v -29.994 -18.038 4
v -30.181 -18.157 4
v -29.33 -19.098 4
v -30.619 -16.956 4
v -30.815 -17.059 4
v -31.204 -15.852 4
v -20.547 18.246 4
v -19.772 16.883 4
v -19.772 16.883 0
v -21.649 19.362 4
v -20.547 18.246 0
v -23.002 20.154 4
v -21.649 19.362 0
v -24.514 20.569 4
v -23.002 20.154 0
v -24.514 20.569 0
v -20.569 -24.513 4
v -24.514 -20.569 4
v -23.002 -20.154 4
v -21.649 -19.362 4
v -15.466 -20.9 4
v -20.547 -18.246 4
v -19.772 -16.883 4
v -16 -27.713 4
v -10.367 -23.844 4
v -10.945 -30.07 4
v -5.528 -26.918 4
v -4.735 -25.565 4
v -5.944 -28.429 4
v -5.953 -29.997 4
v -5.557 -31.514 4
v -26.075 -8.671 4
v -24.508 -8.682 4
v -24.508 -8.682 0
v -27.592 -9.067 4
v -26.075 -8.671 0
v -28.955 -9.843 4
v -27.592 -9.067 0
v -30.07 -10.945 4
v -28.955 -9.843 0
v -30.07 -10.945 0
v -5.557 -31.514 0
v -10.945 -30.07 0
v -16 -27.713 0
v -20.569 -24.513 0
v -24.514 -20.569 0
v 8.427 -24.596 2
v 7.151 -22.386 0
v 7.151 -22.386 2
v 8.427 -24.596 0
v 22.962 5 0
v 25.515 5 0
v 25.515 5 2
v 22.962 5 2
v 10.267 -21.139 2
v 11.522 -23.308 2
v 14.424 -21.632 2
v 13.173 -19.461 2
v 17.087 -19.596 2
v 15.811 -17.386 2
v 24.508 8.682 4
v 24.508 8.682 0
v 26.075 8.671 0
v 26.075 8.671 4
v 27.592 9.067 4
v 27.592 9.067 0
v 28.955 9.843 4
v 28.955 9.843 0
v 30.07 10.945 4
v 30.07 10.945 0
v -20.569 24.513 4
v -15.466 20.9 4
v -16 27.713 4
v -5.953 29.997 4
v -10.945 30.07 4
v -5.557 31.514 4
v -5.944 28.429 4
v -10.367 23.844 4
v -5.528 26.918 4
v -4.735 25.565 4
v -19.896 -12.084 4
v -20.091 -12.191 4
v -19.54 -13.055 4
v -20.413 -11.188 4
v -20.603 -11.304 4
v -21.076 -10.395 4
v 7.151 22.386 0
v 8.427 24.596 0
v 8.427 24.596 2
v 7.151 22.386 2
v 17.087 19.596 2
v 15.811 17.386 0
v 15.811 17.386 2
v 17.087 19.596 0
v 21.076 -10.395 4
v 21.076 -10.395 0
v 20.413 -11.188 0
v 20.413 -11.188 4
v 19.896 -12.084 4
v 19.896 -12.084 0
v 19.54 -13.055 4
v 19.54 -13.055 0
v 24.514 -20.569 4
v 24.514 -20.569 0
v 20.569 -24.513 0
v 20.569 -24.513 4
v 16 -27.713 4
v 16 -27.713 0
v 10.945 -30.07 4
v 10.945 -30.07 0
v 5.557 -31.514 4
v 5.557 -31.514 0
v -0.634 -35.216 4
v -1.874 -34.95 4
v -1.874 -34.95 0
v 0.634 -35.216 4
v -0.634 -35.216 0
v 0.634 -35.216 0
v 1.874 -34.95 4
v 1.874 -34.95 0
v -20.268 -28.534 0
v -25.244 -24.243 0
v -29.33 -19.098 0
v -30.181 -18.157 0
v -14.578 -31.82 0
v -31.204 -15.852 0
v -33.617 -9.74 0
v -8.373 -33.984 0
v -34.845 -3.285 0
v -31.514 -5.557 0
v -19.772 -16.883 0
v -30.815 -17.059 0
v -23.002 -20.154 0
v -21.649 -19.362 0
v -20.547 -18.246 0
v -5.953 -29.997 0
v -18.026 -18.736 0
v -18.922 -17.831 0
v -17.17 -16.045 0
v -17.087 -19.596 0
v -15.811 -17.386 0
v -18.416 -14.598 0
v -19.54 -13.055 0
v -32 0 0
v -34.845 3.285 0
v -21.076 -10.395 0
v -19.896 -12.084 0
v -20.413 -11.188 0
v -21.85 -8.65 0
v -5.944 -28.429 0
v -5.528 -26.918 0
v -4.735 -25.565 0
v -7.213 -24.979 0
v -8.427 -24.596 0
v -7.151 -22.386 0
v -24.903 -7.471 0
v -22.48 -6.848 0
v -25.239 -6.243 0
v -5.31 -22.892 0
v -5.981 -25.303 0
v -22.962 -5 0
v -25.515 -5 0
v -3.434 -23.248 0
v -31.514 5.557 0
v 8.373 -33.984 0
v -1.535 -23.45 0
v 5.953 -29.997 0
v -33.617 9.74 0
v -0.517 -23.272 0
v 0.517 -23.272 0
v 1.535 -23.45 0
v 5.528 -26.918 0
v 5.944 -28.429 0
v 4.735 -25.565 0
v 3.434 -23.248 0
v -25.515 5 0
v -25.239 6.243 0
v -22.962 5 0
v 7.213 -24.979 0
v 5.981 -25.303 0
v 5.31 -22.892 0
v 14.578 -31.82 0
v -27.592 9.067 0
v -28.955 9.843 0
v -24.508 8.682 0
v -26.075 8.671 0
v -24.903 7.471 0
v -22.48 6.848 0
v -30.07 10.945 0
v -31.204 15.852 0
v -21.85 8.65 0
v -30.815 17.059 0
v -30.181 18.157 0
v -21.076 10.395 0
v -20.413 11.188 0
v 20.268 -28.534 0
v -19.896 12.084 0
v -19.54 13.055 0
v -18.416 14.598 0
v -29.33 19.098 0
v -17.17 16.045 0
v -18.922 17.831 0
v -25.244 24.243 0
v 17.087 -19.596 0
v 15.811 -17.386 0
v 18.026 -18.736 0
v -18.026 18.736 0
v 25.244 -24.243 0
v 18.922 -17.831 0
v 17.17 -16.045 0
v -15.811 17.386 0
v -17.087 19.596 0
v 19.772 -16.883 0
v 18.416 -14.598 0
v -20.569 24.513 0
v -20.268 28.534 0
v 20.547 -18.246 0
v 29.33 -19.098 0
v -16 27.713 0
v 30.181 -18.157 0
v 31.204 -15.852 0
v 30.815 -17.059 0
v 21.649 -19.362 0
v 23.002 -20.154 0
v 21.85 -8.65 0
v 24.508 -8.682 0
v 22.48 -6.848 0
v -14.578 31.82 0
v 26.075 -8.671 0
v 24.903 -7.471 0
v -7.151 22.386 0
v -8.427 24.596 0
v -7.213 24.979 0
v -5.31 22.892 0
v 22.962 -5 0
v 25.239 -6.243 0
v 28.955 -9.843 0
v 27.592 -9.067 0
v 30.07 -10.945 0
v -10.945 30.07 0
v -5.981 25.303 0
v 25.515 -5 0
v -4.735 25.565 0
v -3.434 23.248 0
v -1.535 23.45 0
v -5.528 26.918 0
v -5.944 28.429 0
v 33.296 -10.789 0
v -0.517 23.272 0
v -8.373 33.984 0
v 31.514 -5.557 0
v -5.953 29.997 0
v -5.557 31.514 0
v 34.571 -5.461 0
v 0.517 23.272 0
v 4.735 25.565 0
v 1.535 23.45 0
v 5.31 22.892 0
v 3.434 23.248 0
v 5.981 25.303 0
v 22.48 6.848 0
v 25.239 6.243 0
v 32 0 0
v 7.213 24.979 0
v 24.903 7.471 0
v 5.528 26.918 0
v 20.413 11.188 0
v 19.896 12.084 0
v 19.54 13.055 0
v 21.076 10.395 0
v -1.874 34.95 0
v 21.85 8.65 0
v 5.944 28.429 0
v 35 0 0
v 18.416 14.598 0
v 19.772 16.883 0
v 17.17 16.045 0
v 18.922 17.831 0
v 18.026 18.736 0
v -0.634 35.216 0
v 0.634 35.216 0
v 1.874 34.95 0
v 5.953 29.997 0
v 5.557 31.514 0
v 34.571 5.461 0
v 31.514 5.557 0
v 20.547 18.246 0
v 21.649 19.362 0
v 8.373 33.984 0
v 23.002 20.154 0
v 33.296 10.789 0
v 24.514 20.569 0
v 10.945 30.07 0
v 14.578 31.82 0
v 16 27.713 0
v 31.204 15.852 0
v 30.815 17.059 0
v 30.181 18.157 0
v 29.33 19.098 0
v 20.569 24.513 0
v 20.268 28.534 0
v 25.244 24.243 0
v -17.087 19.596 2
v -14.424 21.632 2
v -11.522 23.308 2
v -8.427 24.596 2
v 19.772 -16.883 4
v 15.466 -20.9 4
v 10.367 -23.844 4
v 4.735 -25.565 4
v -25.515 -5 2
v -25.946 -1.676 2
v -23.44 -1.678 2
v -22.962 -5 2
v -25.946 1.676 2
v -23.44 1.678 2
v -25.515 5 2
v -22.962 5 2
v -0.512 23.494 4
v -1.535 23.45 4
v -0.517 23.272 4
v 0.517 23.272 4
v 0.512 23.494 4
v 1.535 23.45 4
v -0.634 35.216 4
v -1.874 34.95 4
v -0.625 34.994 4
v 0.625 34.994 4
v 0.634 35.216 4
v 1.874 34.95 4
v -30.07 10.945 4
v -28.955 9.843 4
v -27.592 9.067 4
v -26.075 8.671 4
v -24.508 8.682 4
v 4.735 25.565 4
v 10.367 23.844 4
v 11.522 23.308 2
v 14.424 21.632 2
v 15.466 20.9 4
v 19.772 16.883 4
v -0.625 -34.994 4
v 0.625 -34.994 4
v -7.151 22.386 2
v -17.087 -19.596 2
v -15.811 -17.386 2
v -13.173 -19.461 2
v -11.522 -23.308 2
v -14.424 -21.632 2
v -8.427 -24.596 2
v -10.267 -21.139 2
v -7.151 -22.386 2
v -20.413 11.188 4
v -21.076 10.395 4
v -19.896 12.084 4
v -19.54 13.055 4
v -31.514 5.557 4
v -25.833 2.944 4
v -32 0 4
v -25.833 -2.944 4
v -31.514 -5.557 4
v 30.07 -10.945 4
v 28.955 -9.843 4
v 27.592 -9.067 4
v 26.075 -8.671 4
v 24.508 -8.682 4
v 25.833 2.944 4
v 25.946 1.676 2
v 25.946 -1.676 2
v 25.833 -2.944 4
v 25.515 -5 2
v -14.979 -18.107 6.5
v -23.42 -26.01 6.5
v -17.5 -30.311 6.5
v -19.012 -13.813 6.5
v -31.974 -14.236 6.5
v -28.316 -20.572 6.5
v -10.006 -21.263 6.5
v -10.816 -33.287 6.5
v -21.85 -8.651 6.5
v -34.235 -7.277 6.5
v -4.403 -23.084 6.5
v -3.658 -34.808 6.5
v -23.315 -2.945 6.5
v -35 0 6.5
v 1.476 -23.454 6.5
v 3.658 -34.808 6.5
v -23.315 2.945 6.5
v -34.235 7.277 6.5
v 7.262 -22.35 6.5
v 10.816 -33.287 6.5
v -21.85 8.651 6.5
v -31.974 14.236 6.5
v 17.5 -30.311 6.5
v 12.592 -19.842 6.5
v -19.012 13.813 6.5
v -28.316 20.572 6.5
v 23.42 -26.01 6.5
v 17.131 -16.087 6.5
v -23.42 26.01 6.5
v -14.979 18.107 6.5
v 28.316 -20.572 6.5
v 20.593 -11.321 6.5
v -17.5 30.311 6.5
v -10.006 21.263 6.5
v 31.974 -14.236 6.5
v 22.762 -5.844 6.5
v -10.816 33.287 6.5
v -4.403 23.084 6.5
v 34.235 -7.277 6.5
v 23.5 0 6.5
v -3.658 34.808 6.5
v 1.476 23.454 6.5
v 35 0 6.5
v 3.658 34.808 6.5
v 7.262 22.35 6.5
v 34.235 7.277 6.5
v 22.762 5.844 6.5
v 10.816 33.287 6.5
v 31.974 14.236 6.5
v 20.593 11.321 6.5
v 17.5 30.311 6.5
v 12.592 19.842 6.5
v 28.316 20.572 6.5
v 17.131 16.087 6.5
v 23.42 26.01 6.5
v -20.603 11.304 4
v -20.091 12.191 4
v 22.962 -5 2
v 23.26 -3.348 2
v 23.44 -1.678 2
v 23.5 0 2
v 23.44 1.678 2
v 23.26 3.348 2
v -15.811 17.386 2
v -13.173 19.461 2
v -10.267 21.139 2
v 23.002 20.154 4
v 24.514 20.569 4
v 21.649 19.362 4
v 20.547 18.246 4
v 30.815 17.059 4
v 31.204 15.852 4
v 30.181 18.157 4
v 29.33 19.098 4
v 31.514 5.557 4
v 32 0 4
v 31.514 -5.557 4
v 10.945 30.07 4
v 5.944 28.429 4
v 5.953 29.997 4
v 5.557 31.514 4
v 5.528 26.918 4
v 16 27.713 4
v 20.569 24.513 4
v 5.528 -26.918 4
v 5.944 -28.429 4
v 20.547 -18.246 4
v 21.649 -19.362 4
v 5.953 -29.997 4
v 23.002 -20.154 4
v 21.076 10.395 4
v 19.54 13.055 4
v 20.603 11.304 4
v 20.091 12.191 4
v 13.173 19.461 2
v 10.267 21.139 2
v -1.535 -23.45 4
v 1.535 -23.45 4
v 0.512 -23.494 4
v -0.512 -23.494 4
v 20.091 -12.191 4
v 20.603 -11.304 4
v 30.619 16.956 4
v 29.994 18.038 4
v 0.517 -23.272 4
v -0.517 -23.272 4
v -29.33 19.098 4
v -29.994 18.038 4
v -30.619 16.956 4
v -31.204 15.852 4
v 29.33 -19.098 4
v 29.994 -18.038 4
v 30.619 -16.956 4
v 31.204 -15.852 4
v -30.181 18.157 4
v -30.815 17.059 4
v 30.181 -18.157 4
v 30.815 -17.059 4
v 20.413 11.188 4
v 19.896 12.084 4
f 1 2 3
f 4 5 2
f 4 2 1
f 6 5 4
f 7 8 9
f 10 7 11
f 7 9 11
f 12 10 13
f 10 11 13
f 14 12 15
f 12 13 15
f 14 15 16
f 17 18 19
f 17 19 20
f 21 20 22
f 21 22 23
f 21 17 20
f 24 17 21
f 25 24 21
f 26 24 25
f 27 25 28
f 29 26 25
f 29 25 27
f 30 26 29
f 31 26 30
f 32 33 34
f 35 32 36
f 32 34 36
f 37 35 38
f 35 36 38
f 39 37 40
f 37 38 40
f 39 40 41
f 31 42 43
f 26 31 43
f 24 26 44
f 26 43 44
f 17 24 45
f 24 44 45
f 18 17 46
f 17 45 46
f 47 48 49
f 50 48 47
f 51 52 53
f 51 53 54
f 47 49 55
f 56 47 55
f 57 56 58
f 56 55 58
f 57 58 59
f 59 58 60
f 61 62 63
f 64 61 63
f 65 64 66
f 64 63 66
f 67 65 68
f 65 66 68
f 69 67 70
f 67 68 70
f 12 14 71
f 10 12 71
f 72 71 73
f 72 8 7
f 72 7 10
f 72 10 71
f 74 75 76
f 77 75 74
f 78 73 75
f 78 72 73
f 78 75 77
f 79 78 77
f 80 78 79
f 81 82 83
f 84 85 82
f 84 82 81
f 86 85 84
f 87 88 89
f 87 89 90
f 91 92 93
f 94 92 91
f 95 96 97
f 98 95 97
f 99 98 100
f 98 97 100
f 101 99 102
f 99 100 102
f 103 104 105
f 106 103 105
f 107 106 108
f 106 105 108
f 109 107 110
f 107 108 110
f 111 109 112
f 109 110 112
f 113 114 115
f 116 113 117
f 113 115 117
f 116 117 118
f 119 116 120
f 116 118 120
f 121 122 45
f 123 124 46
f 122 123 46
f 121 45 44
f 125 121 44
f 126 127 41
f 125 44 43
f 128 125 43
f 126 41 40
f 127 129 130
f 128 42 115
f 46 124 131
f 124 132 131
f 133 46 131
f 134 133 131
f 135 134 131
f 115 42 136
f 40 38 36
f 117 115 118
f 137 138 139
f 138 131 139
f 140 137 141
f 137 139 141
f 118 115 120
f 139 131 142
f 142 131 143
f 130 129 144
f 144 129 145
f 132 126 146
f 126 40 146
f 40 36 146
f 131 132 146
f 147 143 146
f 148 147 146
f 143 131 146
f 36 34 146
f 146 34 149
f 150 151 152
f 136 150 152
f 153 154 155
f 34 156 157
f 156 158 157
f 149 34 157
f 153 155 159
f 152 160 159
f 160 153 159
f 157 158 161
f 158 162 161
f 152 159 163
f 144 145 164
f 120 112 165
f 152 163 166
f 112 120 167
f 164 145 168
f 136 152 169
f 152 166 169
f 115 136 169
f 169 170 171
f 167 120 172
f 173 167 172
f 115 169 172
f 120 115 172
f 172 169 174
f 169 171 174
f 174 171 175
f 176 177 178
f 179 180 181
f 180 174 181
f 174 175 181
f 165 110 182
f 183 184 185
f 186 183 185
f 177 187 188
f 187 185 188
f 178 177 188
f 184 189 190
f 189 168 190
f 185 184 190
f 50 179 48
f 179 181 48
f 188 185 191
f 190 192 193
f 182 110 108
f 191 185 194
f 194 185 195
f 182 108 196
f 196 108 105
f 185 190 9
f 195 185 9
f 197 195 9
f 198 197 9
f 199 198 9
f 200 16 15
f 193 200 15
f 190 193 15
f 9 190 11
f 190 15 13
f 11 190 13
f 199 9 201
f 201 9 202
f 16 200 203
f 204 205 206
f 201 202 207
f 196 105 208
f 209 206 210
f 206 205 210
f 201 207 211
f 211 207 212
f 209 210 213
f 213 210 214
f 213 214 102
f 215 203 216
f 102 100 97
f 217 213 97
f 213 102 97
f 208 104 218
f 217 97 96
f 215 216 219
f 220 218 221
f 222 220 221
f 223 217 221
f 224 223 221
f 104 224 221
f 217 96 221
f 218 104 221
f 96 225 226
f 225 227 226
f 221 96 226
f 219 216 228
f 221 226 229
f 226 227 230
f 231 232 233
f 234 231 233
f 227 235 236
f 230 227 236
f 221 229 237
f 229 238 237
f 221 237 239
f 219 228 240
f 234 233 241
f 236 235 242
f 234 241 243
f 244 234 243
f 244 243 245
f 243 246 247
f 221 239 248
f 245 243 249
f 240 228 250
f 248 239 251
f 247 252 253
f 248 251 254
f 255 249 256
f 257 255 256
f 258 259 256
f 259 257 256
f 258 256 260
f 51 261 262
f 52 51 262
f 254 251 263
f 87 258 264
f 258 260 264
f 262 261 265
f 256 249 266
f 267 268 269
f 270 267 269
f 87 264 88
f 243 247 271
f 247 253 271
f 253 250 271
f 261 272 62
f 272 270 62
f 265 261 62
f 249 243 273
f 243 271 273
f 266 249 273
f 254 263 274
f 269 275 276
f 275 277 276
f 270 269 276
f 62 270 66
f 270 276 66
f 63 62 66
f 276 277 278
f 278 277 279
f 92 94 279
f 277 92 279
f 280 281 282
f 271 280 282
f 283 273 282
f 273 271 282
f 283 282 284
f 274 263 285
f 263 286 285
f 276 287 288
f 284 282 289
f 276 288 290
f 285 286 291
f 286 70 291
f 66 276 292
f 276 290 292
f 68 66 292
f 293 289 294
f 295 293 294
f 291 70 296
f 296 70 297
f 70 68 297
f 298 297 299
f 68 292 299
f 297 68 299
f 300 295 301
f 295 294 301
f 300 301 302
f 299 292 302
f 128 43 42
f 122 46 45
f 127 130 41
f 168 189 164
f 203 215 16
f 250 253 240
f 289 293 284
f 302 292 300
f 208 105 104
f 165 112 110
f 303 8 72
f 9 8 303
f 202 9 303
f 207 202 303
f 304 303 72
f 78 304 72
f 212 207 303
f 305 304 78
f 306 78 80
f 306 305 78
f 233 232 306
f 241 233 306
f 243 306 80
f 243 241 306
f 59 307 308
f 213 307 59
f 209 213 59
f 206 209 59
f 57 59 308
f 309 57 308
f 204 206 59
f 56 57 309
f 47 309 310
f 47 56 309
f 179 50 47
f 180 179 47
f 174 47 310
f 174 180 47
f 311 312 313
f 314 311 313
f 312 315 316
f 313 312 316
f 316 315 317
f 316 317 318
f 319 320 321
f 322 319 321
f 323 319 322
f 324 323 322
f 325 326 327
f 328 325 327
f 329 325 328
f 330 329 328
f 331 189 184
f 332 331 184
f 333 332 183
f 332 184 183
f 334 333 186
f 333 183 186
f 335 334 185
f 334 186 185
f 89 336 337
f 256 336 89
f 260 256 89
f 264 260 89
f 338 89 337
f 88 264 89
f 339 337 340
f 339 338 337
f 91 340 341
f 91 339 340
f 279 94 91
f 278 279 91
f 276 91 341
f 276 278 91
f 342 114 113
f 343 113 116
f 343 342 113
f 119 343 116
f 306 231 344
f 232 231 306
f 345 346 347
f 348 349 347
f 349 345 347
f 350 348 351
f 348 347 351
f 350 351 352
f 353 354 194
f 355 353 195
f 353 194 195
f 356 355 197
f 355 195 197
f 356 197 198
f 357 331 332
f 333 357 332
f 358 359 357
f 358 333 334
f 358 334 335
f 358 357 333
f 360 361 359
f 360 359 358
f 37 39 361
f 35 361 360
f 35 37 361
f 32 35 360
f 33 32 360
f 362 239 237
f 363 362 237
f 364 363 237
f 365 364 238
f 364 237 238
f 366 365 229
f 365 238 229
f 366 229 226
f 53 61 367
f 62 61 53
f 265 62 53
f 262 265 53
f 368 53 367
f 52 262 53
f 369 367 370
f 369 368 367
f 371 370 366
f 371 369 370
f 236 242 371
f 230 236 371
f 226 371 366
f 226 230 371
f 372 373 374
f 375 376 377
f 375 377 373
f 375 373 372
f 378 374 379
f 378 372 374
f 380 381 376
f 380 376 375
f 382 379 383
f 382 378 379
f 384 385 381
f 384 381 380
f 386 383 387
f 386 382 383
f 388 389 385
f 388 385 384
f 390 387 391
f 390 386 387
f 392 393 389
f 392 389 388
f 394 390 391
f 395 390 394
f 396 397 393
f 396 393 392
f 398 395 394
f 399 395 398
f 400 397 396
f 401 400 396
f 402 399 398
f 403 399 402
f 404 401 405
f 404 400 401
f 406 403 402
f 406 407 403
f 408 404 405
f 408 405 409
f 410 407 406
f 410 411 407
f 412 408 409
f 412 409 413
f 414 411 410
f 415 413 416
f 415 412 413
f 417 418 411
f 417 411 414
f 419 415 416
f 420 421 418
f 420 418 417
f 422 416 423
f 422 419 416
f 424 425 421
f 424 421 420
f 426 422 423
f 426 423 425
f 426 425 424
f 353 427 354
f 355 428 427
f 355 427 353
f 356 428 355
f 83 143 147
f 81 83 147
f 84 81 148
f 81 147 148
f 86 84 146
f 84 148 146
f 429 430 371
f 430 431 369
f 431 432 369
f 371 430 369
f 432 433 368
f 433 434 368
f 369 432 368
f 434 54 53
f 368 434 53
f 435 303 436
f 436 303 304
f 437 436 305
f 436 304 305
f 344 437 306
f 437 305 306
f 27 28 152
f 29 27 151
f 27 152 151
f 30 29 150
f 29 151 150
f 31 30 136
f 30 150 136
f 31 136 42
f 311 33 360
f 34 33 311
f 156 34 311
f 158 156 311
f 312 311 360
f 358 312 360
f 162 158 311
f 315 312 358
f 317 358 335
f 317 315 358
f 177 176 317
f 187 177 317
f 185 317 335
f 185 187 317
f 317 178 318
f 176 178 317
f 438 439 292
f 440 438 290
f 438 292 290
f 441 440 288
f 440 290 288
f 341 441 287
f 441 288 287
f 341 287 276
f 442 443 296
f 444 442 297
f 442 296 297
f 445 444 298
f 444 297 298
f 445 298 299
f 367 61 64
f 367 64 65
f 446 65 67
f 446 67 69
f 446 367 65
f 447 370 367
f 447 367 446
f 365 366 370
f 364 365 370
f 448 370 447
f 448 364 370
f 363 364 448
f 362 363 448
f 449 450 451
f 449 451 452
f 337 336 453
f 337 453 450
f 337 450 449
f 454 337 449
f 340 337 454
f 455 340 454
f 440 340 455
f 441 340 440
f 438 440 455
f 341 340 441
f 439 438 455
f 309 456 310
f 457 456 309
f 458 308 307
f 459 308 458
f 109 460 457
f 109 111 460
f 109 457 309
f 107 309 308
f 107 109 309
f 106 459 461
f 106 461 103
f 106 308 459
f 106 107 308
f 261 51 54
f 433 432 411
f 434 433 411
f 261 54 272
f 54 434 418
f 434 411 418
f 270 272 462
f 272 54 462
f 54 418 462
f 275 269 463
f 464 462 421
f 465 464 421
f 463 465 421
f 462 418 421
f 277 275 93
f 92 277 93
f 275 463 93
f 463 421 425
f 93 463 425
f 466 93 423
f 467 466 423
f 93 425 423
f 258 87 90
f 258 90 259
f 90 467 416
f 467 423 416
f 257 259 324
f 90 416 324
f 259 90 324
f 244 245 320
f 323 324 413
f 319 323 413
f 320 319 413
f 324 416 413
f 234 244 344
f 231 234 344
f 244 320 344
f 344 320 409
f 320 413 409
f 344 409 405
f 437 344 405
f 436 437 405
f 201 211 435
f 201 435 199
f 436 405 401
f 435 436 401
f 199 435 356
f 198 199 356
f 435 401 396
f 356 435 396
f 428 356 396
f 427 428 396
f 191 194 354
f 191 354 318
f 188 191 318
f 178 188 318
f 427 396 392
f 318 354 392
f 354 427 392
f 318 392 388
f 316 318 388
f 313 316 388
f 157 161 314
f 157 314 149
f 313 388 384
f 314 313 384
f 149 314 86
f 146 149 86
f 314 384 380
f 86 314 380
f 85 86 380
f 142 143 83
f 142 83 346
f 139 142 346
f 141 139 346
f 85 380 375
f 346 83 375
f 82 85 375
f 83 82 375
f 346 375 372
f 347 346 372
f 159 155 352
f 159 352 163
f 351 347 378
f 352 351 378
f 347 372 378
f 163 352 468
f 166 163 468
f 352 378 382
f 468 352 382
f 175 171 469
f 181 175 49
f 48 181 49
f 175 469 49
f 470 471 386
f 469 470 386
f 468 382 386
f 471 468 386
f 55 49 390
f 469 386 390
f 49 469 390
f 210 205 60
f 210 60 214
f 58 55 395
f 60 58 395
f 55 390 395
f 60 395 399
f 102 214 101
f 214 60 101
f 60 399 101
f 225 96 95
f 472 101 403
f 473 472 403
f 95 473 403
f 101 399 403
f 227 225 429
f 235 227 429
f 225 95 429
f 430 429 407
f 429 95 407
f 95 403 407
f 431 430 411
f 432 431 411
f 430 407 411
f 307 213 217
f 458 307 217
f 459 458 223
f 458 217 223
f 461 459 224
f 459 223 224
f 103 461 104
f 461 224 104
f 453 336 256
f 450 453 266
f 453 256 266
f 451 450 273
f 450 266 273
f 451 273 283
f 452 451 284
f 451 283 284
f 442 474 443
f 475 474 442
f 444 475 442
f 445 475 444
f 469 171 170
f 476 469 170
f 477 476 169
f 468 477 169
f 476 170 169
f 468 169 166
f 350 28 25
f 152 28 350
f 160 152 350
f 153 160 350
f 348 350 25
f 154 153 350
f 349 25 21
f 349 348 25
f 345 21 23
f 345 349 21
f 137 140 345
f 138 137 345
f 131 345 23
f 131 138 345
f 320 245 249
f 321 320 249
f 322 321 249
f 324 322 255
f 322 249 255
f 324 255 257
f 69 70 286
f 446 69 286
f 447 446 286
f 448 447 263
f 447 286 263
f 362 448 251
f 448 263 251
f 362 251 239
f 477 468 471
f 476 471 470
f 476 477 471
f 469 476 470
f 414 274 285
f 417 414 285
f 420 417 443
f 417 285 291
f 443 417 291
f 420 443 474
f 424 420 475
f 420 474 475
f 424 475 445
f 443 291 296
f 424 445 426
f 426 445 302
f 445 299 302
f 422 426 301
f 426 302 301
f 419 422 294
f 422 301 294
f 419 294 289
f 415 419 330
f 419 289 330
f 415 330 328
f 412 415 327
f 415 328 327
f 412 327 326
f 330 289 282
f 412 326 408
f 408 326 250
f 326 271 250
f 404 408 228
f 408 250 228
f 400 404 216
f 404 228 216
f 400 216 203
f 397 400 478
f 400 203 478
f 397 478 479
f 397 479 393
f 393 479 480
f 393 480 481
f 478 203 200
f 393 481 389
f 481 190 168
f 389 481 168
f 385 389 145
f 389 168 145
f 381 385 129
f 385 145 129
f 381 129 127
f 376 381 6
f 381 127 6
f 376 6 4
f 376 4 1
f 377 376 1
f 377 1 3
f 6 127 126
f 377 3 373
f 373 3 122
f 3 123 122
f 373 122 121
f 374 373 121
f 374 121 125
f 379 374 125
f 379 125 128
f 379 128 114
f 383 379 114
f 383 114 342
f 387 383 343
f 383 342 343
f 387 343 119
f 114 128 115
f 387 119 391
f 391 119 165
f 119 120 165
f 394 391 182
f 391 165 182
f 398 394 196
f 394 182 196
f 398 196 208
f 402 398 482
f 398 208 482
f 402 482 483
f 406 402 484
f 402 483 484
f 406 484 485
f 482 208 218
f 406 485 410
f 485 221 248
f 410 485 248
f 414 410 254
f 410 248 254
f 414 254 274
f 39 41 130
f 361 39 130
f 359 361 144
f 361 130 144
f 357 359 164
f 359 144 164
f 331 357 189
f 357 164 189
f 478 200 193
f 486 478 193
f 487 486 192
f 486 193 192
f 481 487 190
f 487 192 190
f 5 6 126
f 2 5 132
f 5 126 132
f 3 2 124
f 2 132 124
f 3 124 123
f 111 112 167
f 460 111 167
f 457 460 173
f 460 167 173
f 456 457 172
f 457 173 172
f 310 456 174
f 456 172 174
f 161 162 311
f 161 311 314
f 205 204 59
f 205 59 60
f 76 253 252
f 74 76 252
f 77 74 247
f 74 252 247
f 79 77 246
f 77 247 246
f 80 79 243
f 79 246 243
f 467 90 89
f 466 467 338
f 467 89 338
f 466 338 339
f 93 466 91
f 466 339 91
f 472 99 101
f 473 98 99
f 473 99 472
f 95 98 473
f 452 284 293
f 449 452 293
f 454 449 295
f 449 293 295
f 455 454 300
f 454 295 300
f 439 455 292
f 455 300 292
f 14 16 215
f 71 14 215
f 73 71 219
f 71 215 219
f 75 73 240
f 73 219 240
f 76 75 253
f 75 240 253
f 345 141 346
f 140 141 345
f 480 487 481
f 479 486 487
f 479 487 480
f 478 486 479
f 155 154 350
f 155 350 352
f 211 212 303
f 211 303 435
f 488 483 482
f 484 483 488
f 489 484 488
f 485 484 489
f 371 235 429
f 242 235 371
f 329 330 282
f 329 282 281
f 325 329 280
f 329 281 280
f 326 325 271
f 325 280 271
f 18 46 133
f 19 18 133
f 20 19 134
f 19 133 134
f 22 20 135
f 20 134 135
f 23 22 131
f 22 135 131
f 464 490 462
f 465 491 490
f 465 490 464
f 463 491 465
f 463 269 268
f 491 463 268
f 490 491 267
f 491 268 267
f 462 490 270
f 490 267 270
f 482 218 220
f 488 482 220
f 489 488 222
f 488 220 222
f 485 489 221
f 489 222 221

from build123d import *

# Parameters (mm, degrees)
F0_R     = 35
F1_DEPTH = 6.5
F2_R     = 23.5
F3_DEPTH = 6.5
F4_R     = 32
F4_R_2   = 26
F5_DEPTH = 4
F7_DEPTH = 2
F8_R     = 6
F9_DEPTH = 4


with BuildPart() as f1:
    # F0 (on Top) → F1 (new body)
    with BuildSketch(Plane.XY):
        Circle(F0_R)
    extrude(amount=F1_DEPTH)

    # F2 (on face) → F3 (cut, through all)
    with BuildSketch(Plane.XY.offset(6.5)):
        Circle(F2_R)
    extrude(amount=-F3_DEPTH, mode=Mode.SUBTRACT)

    # F4 (on face) → F5 (cut)
    with BuildSketch(Plane(origin=(0, 0, 0), x_dir=(1, 0, 0), z_dir=(0, 0, -1))):
        Circle(F4_R)
        Circle(F4_R_2, mode=Mode.SUBTRACT)
    extrude(amount=-F5_DEPTH, mode=Mode.SUBTRACT)

    # F6 (on Top) → F7 (cut)
    with BuildSketch(Plane.XY):
        Polygon((-26, 5), (-26, -5), (-8.6602540378, -5), (-17.3301270189, -20.0166604984), (-8.6698729811, -25.0166604984), (0, -10), (8.6698729811, -25.0166604984), (17.3301270189, -20.0166604984), (8.6602540378, -5), (26, -5), (26, 5), (8.6602540378, 5), (17.3301270189, 20.0166604984), (8.6698729811, 25.0166604984), (0, 10), (-8.6698729811, 25.0166604984), (-17.3301270189, 20.0166604984), (-8.6602540378, 5), align=None)
    extrude(amount=F7_DEPTH, mode=Mode.SUBTRACT)

    # F8 (on Top) → F9 (join)
    with BuildSketch(Plane.XY):
        with Locations((0, -29.25)):
            Circle(F8_R)
        with Locations((25.3312430607, -14.625)):
            Circle(F8_R)
        with Locations((25.3312430607, 14.625)):
            Circle(F8_R)
        with Locations((0, 29.25)):
            Circle(F8_R)
        with Locations((-25.3312430607, 14.625)):
            Circle(F8_R)
        with Locations((-25.3312430607, -14.625)):
            Circle(F8_R)
    extrude(amount=F9_DEPTH)


solid = f1.part
